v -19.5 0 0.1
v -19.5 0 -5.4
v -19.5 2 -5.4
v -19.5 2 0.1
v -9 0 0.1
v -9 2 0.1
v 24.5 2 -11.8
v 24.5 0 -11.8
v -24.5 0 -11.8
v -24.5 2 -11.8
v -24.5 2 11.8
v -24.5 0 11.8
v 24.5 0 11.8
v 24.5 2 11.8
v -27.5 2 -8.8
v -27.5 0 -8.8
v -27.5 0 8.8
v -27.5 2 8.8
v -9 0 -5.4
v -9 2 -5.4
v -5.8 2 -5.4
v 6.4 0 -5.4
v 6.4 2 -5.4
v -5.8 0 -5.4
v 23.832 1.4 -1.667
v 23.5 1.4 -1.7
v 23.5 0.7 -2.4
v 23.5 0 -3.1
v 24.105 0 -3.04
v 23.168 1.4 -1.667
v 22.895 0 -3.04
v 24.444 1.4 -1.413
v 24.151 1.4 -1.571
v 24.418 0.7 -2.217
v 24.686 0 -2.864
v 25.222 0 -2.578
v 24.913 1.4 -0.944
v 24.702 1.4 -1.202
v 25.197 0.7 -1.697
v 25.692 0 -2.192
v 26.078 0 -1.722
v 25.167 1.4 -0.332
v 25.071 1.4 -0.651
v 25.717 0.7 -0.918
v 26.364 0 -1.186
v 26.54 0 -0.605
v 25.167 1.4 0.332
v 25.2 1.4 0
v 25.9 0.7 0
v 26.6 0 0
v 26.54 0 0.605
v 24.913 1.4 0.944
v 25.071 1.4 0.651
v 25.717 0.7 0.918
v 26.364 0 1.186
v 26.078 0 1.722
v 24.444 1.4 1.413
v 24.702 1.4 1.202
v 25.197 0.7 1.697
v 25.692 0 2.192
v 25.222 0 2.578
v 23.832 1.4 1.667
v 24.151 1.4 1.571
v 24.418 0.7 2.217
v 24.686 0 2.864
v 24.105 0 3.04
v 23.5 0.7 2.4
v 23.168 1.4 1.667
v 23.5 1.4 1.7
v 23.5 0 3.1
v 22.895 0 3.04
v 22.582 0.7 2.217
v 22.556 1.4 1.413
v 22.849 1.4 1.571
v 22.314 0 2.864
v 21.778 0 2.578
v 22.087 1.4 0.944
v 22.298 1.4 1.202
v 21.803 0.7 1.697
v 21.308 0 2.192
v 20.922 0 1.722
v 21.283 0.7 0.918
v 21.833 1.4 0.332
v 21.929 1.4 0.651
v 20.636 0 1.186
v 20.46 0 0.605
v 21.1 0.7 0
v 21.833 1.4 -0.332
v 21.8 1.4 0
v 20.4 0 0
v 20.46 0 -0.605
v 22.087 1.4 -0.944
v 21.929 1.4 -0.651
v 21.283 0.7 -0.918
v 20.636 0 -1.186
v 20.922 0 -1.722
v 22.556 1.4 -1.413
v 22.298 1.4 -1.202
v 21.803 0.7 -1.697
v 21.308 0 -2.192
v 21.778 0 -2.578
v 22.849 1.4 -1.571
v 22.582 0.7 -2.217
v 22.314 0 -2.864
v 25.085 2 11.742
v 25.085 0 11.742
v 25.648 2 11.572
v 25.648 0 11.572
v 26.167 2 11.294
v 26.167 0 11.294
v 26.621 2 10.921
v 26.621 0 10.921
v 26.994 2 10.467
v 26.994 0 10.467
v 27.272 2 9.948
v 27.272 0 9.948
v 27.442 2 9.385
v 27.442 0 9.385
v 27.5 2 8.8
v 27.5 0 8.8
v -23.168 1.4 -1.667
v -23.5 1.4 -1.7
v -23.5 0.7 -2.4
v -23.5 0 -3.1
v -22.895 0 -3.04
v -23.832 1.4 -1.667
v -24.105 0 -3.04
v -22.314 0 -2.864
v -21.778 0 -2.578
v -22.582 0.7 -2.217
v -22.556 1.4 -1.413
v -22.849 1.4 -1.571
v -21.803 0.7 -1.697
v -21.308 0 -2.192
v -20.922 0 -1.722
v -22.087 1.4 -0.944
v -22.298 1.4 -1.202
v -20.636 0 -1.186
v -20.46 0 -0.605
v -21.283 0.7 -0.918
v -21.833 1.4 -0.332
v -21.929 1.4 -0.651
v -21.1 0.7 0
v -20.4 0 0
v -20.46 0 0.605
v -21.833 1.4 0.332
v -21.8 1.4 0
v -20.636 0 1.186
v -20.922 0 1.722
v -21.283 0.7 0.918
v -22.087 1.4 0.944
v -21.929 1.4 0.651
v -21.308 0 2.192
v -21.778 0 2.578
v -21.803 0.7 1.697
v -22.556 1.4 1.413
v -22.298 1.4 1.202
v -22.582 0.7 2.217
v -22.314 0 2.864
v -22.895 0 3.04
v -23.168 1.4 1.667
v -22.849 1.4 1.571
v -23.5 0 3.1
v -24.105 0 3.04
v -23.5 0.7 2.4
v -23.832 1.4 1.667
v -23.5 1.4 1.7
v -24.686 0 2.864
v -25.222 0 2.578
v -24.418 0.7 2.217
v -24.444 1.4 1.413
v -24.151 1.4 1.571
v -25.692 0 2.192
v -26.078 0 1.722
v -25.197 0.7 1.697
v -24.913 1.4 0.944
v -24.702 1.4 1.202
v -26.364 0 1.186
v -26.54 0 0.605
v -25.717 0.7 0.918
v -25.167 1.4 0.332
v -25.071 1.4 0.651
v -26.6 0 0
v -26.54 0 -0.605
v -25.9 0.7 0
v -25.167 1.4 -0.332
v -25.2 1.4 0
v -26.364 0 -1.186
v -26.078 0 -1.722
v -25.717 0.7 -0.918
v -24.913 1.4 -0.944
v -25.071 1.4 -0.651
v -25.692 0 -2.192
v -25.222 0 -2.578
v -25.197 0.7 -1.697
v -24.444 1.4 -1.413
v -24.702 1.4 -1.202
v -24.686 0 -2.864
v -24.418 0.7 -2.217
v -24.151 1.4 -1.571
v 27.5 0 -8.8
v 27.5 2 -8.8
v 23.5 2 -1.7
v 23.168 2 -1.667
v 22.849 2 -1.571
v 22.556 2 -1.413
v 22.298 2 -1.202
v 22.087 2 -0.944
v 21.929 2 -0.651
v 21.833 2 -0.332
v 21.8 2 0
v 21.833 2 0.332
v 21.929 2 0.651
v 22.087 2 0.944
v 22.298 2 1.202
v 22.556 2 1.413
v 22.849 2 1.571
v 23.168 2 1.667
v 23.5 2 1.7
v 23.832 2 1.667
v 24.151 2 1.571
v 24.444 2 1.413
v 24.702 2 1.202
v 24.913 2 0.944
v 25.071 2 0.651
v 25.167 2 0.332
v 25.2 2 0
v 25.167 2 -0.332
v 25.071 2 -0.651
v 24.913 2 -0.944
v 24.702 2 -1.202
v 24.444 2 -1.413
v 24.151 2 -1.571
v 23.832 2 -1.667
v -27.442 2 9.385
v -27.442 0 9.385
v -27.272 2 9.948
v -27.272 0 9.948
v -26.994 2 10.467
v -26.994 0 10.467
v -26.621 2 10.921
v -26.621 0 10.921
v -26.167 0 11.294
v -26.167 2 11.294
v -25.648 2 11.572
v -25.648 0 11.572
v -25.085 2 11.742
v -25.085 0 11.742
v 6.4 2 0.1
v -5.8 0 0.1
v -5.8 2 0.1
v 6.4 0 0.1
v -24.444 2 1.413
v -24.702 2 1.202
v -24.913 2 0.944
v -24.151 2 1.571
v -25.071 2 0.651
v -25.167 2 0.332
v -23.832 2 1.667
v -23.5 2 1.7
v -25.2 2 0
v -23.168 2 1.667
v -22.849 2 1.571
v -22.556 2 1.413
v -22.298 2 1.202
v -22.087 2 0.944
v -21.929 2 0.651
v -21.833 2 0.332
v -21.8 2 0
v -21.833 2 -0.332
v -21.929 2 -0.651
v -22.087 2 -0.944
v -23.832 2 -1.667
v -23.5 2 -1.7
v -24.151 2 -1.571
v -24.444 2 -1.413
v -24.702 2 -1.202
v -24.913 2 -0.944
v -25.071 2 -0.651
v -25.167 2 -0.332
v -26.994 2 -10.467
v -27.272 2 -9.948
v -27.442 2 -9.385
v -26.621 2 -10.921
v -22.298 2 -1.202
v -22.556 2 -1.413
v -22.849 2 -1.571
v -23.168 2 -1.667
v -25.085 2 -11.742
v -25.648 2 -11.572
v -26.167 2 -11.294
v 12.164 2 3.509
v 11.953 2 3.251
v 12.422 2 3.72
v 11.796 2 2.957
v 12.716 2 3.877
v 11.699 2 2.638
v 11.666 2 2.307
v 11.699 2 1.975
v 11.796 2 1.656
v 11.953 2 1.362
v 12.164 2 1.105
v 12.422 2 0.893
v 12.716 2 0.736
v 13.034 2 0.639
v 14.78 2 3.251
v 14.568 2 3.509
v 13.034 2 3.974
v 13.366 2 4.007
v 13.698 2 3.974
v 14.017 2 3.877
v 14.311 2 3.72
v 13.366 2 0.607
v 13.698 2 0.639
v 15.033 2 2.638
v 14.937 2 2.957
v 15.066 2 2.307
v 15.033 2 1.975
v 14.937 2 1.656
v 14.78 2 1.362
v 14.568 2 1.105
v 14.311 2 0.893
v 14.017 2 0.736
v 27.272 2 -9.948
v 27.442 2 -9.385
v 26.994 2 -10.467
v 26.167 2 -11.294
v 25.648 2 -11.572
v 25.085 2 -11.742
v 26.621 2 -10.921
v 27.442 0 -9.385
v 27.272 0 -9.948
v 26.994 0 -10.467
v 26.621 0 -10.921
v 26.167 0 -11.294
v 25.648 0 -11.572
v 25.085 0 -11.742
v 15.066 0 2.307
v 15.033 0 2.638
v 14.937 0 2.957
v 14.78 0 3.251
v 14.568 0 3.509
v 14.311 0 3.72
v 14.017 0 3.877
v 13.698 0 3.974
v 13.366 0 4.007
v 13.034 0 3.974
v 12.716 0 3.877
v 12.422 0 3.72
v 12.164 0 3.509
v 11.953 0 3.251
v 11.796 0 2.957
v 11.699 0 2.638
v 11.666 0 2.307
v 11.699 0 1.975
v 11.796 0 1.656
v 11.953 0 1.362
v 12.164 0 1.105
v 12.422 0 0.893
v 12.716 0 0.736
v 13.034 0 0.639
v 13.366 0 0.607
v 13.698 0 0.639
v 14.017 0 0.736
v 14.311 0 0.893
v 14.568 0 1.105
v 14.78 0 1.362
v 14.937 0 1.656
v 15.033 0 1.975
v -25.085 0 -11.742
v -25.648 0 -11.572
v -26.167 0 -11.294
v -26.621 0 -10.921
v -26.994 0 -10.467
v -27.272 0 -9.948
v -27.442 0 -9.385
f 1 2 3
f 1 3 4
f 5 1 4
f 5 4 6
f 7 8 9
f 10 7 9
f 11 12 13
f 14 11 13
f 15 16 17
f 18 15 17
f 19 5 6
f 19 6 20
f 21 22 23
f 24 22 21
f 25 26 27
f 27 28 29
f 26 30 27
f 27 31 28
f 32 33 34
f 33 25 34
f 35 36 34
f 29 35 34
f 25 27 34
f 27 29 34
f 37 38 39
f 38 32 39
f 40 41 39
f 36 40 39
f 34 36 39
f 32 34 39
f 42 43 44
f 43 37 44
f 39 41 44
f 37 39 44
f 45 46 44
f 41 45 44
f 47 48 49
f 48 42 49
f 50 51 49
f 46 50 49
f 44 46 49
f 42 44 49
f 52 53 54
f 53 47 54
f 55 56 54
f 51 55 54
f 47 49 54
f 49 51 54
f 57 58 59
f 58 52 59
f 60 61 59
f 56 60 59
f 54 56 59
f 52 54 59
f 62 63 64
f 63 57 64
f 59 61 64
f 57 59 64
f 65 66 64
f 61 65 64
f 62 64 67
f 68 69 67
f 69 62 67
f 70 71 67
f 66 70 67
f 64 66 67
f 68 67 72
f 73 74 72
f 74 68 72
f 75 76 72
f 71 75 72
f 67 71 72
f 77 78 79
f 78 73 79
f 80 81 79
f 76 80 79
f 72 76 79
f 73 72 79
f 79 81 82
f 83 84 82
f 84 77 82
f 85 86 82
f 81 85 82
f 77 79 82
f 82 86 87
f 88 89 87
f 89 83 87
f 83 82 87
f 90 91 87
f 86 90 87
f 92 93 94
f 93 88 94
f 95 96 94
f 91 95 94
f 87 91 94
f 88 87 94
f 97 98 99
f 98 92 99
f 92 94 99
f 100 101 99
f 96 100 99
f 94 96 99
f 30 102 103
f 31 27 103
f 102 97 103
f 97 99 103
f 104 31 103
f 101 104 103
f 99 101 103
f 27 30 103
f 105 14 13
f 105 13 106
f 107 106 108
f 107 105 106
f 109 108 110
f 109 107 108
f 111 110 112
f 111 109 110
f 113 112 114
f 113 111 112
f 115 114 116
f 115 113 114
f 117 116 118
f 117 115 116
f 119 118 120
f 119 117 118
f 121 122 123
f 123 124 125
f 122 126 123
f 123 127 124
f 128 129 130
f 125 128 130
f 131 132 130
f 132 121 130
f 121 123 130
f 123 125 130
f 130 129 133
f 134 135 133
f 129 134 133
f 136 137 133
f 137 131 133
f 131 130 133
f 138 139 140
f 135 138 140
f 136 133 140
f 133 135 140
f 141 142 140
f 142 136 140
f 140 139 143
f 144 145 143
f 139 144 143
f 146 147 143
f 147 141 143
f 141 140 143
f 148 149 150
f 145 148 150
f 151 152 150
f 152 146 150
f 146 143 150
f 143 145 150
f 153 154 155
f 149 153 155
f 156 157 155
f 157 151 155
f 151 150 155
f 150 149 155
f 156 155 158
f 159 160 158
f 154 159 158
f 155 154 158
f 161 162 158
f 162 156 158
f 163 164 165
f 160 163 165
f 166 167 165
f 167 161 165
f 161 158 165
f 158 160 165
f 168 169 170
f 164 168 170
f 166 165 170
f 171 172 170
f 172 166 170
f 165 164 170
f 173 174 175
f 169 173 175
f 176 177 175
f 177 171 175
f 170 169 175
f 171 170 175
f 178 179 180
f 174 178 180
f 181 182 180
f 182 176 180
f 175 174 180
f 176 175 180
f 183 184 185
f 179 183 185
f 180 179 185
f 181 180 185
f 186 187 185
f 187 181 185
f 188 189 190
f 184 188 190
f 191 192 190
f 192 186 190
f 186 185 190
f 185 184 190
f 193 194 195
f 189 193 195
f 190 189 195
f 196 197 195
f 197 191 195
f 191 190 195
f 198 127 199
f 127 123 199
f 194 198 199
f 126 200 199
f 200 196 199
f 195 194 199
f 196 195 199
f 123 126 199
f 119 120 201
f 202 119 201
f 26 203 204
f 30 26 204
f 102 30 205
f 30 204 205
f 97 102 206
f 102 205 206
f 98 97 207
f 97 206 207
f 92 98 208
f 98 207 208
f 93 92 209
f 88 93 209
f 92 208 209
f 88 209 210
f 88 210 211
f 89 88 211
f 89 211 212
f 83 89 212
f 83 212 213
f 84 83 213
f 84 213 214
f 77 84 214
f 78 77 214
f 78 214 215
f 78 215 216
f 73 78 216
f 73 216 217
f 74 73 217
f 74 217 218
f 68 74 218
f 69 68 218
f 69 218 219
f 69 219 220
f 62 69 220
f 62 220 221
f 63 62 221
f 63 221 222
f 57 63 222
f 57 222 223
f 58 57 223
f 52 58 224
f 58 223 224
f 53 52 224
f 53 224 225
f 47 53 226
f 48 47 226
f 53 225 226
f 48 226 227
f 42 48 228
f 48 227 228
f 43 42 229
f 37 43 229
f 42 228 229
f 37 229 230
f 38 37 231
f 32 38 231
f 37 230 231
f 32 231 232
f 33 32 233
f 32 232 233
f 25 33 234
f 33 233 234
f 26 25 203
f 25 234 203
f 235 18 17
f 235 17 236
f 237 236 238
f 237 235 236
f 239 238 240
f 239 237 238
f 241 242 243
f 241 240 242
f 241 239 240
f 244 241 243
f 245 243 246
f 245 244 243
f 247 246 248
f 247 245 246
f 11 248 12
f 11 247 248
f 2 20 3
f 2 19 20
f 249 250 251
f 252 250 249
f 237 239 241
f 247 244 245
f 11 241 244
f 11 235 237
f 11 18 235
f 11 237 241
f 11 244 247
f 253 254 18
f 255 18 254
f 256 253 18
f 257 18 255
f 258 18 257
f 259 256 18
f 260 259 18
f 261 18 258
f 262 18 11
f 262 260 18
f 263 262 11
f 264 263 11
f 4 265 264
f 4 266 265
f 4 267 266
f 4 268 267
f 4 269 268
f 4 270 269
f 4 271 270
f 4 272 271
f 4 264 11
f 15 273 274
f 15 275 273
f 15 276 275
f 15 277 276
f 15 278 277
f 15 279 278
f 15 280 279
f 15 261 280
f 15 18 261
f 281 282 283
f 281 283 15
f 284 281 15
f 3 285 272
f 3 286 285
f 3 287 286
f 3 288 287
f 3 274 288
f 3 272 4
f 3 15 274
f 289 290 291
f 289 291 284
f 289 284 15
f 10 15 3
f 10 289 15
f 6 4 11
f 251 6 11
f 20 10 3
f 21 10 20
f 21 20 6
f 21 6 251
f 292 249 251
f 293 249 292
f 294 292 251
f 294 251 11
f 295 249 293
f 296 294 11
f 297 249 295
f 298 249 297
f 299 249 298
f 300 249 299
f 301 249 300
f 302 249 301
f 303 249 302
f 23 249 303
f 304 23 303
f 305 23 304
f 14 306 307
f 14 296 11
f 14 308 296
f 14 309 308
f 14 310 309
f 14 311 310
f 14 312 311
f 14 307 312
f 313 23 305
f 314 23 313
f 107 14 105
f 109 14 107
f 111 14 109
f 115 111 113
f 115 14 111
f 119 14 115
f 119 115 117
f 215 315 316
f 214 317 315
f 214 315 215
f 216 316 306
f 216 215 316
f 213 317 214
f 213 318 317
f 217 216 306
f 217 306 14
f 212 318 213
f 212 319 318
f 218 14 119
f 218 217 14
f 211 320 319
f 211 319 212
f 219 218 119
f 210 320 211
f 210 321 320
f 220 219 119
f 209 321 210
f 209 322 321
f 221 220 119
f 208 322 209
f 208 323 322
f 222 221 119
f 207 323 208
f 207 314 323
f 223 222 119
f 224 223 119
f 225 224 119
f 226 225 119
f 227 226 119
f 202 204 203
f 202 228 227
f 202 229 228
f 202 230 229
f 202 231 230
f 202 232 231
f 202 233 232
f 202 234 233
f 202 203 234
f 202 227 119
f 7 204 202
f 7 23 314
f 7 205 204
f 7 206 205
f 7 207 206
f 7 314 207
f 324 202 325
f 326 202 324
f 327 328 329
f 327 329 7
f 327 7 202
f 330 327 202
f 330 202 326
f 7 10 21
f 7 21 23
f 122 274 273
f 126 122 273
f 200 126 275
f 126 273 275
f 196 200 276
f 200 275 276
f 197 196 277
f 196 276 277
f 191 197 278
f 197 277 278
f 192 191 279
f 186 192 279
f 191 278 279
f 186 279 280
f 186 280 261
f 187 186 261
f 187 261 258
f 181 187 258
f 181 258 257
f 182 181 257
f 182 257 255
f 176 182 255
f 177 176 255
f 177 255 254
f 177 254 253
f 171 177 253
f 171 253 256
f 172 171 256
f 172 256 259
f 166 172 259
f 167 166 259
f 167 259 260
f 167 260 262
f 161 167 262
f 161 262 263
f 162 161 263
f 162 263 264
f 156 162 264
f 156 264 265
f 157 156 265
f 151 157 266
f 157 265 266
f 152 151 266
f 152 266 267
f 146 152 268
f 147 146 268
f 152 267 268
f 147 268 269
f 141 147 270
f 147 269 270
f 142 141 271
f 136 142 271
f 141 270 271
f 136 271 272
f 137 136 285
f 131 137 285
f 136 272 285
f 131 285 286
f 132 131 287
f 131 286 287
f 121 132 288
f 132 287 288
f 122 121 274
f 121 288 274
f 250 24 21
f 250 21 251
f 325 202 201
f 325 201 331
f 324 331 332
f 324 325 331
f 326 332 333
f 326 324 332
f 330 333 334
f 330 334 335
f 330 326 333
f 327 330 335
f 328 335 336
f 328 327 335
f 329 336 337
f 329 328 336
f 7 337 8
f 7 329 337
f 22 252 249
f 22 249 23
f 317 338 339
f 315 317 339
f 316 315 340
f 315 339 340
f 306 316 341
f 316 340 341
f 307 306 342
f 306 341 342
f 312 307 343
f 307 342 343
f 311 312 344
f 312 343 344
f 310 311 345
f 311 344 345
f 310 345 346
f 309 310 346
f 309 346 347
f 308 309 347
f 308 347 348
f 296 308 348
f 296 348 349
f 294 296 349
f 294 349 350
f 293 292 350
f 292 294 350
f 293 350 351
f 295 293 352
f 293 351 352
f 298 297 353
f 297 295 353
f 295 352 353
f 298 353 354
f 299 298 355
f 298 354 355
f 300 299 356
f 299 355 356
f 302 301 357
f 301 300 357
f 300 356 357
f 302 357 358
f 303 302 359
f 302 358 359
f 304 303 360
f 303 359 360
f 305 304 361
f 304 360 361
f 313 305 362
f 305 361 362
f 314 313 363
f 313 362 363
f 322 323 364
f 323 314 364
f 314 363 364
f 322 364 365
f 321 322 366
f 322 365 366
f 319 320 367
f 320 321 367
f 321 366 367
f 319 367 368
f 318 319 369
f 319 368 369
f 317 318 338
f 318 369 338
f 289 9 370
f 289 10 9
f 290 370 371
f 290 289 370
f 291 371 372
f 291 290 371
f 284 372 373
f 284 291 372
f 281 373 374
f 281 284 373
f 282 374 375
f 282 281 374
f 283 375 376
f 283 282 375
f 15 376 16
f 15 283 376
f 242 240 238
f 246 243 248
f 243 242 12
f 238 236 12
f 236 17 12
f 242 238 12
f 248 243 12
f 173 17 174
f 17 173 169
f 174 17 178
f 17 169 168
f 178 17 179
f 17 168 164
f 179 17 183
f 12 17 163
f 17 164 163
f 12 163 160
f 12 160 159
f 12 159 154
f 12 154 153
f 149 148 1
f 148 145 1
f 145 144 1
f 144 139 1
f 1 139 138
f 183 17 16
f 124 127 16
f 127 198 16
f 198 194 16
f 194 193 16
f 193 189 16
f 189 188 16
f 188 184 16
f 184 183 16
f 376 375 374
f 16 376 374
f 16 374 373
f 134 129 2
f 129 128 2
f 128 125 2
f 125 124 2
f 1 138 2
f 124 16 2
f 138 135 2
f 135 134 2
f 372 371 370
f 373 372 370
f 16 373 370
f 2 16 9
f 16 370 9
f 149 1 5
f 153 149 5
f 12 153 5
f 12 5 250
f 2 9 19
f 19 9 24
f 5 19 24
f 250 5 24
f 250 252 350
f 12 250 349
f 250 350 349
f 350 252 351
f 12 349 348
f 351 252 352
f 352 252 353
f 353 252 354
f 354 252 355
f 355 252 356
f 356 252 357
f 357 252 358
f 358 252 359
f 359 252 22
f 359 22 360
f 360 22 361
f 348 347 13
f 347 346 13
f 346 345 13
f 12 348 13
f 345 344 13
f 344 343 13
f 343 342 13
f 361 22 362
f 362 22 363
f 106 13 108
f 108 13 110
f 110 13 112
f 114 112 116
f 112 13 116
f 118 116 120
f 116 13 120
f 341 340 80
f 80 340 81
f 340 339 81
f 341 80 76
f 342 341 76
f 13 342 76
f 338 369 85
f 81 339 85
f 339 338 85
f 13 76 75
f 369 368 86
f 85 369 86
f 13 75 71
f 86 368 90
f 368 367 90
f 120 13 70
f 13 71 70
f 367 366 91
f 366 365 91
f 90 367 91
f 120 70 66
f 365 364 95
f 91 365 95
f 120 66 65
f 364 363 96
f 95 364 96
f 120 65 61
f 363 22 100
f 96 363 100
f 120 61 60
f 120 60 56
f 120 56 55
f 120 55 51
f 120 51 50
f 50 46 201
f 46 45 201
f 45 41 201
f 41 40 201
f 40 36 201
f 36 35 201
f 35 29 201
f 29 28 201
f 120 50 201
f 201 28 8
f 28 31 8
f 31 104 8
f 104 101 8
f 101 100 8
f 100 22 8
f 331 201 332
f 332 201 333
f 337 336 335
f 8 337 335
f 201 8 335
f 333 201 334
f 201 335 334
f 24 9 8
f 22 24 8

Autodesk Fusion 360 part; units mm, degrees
sketch "Skizze1" plane through (0, 0, 0) normal (0, 1, 0) x (1, 0, 0)
  line L0 (27.5, 11.8) -> (-27.5, 11.8)
  line L1 (-27.5, 11.8) -> (-27.5, -11.8)
  line L2 (-27.5, -11.8) -> (27.5, -11.8)
  line L3 (27.5, -11.8) -> (27.5, 11.8)
  line L4 (27.5, 11.8) -> (-27.5, -11.8) construction
  line L5 (-27.5, 11.8) -> (27.5, -11.8) construction
  line L6 (-19.5, -0.1) -> (-9, -0.1)
  line L7 (-9, -0.1) -> (-9, 5.4)
  line L8 (-9, 5.4) -> (-19.5, 5.4)
  line L9 (-19.5, 5.4) -> (-19.5, -0.1)
  line L10 (-5.8, -0.1) -> (6.4, -0.1)
  line L11 (6.4, -0.1) -> (6.4, 5.4)
  line L12 (6.4, 5.4) -> (-5.8, 5.4)
  line L13 (-5.8, 5.4) -> (-5.8, -0.1)
  circle A0 centre (13.3661, -2.3066) radius 1.7
  point P0 (-27.5, 0)
  point P1 (-23.5, 0)
  point P2 (23.5, 0)
  dimension "d1" = 55
  dimension "d2" = 23.6
  dimension "d3" = 10.5
  dimension "d4" = 5.5
  dimension "d5" = 5.5
  dimension "d6" = 12.2
  dimension "d7" = 3.2
  dimension "d8" = 6.4
  dimension "d9" = 8
  dimension "d10" = 3.4
  dimension "d17" = 47
  dimension "d18" = 23.5
extrude "Extrusion1" add sketch "Skizze1" along normal blind 2
hole "Bohrung1" at (23.5, 0, 0) at (-23.5, 0, 0) direction (0, 1, 0) diameter 3.4 end through all countersink diameter 6.2 countersink angle 90
fillet "Abrundung1" radius 3 4 edges at (27.5, 1, 11.8) (-27.5, 1, 11.8) (-27.5, 1, -11.8) (27.5, 1, -11.8)
equation "d5 = d4"
equation "d18 = d17 / 2"
